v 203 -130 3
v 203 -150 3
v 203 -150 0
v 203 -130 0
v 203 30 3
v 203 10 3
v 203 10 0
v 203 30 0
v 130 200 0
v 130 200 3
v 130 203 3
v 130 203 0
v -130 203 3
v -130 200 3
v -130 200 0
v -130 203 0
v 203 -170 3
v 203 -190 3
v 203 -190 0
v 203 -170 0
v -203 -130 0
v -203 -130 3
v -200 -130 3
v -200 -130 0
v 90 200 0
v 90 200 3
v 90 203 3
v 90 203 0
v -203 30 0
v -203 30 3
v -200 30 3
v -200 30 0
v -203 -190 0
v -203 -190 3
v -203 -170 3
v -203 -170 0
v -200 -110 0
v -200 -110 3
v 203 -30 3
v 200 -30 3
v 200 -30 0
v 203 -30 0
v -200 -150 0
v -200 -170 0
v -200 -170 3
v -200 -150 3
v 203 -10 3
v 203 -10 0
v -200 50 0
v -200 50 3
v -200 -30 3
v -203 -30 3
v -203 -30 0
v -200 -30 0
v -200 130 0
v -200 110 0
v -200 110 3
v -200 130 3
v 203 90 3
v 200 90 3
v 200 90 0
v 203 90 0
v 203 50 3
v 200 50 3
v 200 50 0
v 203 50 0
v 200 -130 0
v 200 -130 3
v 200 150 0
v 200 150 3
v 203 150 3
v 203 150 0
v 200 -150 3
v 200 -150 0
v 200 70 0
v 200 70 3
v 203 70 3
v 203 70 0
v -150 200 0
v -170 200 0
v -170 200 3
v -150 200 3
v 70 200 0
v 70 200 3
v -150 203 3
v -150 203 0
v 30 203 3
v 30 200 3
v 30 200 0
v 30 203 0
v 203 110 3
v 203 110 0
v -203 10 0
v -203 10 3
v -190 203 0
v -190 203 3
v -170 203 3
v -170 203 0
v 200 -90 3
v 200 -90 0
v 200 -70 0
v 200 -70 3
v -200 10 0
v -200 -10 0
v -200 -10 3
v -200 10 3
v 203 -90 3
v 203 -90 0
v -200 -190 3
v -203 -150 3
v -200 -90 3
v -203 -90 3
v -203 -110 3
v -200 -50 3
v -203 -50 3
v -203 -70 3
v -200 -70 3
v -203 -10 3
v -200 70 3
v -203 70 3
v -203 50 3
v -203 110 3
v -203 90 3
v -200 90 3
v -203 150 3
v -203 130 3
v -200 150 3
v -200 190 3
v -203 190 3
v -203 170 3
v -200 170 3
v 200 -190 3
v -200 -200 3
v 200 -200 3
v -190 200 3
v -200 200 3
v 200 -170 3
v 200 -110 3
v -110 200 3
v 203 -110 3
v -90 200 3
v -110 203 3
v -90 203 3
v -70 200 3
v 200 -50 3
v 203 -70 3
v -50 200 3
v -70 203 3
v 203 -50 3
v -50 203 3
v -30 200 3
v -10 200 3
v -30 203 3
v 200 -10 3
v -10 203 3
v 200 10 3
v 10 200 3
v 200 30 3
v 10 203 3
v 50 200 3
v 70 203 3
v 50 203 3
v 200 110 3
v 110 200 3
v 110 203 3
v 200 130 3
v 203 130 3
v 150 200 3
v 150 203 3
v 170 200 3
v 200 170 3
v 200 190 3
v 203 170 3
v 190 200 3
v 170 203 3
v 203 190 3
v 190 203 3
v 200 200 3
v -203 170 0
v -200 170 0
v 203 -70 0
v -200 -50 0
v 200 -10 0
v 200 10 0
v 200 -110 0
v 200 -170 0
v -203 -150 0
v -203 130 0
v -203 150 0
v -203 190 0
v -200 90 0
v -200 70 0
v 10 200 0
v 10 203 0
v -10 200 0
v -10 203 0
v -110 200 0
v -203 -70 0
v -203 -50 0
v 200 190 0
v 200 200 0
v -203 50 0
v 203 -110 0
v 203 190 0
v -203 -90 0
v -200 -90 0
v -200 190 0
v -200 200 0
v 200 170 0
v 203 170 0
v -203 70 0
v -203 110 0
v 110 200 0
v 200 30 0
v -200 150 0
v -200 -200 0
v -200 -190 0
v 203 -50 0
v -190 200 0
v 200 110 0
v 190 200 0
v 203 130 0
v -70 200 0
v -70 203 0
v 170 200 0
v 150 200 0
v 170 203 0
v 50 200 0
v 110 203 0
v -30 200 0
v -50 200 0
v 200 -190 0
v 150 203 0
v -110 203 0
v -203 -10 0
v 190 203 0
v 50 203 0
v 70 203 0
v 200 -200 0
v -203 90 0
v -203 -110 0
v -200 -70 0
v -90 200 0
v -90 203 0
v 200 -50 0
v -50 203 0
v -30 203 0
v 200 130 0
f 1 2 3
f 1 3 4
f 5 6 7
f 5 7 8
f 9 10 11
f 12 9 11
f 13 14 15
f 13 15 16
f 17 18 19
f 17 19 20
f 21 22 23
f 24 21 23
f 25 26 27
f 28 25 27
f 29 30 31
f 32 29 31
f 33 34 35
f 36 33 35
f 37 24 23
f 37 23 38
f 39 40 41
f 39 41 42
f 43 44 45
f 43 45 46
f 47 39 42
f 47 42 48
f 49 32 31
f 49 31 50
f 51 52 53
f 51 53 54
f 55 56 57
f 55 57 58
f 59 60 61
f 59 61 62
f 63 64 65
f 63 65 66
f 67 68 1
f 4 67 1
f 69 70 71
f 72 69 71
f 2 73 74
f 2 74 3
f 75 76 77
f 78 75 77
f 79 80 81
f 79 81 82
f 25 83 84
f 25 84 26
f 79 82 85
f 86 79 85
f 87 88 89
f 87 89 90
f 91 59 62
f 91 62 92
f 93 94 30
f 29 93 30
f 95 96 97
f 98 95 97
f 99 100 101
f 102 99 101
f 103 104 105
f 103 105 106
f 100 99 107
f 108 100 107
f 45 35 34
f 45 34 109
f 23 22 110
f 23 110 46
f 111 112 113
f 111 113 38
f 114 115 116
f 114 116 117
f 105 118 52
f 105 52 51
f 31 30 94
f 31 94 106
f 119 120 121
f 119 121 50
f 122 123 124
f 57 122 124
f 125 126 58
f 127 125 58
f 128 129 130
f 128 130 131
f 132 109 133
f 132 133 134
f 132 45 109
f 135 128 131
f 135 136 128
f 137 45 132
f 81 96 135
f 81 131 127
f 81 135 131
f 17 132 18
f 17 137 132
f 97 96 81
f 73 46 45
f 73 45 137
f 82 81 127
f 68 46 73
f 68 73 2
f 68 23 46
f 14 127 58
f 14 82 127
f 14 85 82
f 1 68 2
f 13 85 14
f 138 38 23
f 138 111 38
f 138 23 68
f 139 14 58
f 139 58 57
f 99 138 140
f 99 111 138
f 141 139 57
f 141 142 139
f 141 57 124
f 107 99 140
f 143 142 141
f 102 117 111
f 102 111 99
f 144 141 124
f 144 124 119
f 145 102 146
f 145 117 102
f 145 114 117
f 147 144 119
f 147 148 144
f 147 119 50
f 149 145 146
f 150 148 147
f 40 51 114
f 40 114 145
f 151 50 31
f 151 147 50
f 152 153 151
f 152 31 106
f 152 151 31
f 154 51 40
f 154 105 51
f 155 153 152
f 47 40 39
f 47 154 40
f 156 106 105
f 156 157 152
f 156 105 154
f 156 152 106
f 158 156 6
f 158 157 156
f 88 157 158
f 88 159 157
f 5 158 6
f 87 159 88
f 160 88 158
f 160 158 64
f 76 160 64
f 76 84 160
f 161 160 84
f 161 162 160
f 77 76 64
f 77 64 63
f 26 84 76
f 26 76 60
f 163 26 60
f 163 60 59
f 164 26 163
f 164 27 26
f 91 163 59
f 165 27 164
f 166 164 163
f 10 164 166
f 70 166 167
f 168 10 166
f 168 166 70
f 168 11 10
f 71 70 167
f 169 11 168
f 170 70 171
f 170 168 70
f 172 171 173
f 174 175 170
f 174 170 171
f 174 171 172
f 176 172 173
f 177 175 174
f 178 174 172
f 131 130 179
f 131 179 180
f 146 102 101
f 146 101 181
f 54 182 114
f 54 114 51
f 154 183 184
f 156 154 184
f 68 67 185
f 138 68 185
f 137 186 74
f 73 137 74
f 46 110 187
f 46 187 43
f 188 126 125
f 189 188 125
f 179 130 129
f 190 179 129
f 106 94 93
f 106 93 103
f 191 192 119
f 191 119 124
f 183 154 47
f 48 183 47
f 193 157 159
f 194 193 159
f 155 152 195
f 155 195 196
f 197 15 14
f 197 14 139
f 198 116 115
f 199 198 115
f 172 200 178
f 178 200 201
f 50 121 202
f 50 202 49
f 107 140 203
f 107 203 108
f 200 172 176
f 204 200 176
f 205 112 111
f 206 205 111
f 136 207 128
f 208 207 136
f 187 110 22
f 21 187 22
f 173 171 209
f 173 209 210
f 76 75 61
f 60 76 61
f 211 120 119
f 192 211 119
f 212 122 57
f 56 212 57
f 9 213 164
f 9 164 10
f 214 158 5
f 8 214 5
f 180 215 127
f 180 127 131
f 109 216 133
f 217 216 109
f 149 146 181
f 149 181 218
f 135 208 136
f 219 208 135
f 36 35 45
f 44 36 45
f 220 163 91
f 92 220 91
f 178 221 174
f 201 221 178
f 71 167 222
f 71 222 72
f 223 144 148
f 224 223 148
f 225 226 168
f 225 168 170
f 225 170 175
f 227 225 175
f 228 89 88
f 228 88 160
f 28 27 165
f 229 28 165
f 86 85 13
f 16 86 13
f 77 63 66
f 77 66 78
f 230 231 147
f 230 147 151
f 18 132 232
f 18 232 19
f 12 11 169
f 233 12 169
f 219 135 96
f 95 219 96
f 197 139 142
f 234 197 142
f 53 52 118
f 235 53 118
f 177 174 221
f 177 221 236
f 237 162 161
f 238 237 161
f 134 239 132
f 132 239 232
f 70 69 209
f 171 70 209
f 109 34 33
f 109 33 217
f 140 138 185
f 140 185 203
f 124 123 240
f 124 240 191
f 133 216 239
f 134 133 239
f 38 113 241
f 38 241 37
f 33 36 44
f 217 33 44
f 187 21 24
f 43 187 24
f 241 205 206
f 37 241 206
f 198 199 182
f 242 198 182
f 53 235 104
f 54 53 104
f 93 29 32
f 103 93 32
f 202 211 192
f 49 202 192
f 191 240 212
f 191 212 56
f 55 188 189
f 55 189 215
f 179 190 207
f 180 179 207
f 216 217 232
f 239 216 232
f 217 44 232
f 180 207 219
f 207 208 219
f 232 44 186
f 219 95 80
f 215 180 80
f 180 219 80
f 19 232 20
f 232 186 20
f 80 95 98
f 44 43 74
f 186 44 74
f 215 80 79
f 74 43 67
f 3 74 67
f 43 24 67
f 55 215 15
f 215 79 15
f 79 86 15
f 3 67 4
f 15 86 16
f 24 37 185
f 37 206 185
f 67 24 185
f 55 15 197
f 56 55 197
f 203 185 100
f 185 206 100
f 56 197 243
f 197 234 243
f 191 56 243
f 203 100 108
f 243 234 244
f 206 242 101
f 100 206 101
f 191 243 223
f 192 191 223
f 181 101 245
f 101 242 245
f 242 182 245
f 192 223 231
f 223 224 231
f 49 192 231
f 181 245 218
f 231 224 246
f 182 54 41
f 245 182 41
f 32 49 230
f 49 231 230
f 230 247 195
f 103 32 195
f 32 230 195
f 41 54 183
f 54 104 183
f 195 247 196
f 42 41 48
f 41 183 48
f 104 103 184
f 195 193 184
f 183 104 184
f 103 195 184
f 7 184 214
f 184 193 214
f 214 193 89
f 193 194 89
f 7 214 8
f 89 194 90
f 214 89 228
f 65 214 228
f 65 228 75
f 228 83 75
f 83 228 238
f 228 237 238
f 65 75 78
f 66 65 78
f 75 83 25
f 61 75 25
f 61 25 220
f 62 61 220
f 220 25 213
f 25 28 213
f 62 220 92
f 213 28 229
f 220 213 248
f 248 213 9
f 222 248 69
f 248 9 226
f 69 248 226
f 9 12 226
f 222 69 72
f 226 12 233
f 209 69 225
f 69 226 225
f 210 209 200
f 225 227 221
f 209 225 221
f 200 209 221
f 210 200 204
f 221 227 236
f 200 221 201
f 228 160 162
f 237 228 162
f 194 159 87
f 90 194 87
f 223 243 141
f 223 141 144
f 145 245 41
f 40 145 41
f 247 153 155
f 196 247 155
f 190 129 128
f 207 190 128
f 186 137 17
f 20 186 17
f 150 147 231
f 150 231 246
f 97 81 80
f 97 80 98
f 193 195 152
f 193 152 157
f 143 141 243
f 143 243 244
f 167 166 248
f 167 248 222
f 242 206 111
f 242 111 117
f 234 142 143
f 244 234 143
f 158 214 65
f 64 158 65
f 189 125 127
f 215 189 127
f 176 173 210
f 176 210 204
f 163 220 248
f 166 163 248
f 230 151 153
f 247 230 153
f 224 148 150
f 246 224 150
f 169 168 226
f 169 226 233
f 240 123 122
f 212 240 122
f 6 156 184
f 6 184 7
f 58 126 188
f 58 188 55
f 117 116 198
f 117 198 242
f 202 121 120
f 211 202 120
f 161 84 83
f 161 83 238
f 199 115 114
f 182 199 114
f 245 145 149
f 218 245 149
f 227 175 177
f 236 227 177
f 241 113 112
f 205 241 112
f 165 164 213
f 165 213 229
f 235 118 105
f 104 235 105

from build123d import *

# Parameters (mm, degrees)
F0_W     = 400
F0_H     = 400
F1_DEPTH = 3
F2_W     = 20
F2_H     = 3
F2_W_2   = 3
F2_H_2   = 20
F3_DEPTH = 3
F4_W     = 380
F4_H     = 3
F5_DEPTH = 25


with BuildPart() as f1:
    # F0 (on Top) → F1 (new body)
    with BuildSketch(Plane.XY):
        Rectangle(F0_W, F0_H)
    extrude(amount=F1_DEPTH)

    # F2 (on face) → F3 (join, through all)
    with BuildSketch(Plane.XY.offset(3)):
        with Locations((-180, -201.5)):
            Rectangle(F2_W, F2_H)
        with Locations((-140, -201.5)):
            Rectangle(F2_W, F2_H)
        with Locations((-100, -201.5)):
            Rectangle(F2_W, F2_H)
        with Locations((-60, -201.5)):
            Rectangle(F2_W, F2_H)
        with Locations((-20, -201.5)):
            Rectangle(F2_W, F2_H)
        with Locations((20, -201.5)):
            Rectangle(F2_W, F2_H)
        with Locations((60, -201.5)):
            Rectangle(F2_W, F2_H)
        with Locations((100, -201.5)):
            Rectangle(F2_W, F2_H)
        with Locations((140, -201.5)):
            Rectangle(F2_W, F2_H)
        with Locations((180, -201.5)):
            Rectangle(F2_W, F2_H)
        with Locations((201.5, 100)):
            Rectangle(F2_W_2, F2_H_2)
        with Locations((201.5, 180)):
            Rectangle(F2_W_2, F2_H_2)
        with Locations((201.5, 20)):
            Rectangle(F2_W_2, F2_H_2)
        with Locations((201.5, 140)):
            Rectangle(F2_W_2, F2_H_2)
        with Locations((201.5, -20)):
            Rectangle(F2_W_2, F2_H_2)
        with Locations((201.5, 60)):
            Rectangle(F2_W_2, F2_H_2)
        with Locations((201.5, -60)):
            Rectangle(F2_W_2, F2_H_2)
        with Locations((201.5, -180)):
            Rectangle(F2_W_2, F2_H_2)
        with Locations((201.5, -140)):
            Rectangle(F2_W_2, F2_H_2)
        with Locations((201.5, -100)):
            Rectangle(F2_W_2, F2_H_2)
        with Locations((-100, 201.5)):
            Rectangle(F2_W, F2_H)
        with Locations((-180, 201.5)):
            Rectangle(F2_W, F2_H)
        with Locations((-20, 201.5)):
            Rectangle(F2_W, F2_H)
        with Locations((-140, 201.5)):
            Rectangle(F2_W, F2_H)
        with Locations((20, 201.5)):
            Rectangle(F2_W, F2_H)
        with Locations((-60, 201.5)):
            Rectangle(F2_W, F2_H)
        with Locations((60, 201.5)):
            Rectangle(F2_W, F2_H)
        with Locations((180, 201.5)):
            Rectangle(F2_W, F2_H)
        with Locations((140, 201.5)):
            Rectangle(F2_W, F2_H)
        with Locations((100, 201.5)):
            Rectangle(F2_W, F2_H)
        with Locations((-201.5, -100)):
            Rectangle(F2_W_2, F2_H_2)
        with Locations((-201.5, -180)):
            Rectangle(F2_W_2, F2_H_2)
        with Locations((-201.5, -20)):
            Rectangle(F2_W_2, F2_H_2)
        with Locations((-201.5, -140)):
            Rectangle(F2_W_2, F2_H_2)
        with Locations((-201.5, 20)):
            Rectangle(F2_W_2, F2_H_2)
        with Locations((-201.5, -60)):
            Rectangle(F2_W_2, F2_H_2)
        with Locations((-201.5, 60)):
            Rectangle(F2_W_2, F2_H_2)
        with Locations((-201.5, 180)):
            Rectangle(F2_W_2, F2_H_2)
        with Locations((-201.5, 140)):
            Rectangle(F2_W_2, F2_H_2)
        with Locations((-201.5, 100)):
            Rectangle(F2_W_2, F2_H_2)
    extrude(amount=-F3_DEPTH)

    # F4 (on face) → F5 (cut)
    with BuildSketch(Plane.XY.offset(3)):
        with Locations((0, -201.5)):
            Rectangle(F4_W, F4_H)
    extrude(amount=-F5_DEPTH, mode=Mode.SUBTRACT)


solid = f1.part
